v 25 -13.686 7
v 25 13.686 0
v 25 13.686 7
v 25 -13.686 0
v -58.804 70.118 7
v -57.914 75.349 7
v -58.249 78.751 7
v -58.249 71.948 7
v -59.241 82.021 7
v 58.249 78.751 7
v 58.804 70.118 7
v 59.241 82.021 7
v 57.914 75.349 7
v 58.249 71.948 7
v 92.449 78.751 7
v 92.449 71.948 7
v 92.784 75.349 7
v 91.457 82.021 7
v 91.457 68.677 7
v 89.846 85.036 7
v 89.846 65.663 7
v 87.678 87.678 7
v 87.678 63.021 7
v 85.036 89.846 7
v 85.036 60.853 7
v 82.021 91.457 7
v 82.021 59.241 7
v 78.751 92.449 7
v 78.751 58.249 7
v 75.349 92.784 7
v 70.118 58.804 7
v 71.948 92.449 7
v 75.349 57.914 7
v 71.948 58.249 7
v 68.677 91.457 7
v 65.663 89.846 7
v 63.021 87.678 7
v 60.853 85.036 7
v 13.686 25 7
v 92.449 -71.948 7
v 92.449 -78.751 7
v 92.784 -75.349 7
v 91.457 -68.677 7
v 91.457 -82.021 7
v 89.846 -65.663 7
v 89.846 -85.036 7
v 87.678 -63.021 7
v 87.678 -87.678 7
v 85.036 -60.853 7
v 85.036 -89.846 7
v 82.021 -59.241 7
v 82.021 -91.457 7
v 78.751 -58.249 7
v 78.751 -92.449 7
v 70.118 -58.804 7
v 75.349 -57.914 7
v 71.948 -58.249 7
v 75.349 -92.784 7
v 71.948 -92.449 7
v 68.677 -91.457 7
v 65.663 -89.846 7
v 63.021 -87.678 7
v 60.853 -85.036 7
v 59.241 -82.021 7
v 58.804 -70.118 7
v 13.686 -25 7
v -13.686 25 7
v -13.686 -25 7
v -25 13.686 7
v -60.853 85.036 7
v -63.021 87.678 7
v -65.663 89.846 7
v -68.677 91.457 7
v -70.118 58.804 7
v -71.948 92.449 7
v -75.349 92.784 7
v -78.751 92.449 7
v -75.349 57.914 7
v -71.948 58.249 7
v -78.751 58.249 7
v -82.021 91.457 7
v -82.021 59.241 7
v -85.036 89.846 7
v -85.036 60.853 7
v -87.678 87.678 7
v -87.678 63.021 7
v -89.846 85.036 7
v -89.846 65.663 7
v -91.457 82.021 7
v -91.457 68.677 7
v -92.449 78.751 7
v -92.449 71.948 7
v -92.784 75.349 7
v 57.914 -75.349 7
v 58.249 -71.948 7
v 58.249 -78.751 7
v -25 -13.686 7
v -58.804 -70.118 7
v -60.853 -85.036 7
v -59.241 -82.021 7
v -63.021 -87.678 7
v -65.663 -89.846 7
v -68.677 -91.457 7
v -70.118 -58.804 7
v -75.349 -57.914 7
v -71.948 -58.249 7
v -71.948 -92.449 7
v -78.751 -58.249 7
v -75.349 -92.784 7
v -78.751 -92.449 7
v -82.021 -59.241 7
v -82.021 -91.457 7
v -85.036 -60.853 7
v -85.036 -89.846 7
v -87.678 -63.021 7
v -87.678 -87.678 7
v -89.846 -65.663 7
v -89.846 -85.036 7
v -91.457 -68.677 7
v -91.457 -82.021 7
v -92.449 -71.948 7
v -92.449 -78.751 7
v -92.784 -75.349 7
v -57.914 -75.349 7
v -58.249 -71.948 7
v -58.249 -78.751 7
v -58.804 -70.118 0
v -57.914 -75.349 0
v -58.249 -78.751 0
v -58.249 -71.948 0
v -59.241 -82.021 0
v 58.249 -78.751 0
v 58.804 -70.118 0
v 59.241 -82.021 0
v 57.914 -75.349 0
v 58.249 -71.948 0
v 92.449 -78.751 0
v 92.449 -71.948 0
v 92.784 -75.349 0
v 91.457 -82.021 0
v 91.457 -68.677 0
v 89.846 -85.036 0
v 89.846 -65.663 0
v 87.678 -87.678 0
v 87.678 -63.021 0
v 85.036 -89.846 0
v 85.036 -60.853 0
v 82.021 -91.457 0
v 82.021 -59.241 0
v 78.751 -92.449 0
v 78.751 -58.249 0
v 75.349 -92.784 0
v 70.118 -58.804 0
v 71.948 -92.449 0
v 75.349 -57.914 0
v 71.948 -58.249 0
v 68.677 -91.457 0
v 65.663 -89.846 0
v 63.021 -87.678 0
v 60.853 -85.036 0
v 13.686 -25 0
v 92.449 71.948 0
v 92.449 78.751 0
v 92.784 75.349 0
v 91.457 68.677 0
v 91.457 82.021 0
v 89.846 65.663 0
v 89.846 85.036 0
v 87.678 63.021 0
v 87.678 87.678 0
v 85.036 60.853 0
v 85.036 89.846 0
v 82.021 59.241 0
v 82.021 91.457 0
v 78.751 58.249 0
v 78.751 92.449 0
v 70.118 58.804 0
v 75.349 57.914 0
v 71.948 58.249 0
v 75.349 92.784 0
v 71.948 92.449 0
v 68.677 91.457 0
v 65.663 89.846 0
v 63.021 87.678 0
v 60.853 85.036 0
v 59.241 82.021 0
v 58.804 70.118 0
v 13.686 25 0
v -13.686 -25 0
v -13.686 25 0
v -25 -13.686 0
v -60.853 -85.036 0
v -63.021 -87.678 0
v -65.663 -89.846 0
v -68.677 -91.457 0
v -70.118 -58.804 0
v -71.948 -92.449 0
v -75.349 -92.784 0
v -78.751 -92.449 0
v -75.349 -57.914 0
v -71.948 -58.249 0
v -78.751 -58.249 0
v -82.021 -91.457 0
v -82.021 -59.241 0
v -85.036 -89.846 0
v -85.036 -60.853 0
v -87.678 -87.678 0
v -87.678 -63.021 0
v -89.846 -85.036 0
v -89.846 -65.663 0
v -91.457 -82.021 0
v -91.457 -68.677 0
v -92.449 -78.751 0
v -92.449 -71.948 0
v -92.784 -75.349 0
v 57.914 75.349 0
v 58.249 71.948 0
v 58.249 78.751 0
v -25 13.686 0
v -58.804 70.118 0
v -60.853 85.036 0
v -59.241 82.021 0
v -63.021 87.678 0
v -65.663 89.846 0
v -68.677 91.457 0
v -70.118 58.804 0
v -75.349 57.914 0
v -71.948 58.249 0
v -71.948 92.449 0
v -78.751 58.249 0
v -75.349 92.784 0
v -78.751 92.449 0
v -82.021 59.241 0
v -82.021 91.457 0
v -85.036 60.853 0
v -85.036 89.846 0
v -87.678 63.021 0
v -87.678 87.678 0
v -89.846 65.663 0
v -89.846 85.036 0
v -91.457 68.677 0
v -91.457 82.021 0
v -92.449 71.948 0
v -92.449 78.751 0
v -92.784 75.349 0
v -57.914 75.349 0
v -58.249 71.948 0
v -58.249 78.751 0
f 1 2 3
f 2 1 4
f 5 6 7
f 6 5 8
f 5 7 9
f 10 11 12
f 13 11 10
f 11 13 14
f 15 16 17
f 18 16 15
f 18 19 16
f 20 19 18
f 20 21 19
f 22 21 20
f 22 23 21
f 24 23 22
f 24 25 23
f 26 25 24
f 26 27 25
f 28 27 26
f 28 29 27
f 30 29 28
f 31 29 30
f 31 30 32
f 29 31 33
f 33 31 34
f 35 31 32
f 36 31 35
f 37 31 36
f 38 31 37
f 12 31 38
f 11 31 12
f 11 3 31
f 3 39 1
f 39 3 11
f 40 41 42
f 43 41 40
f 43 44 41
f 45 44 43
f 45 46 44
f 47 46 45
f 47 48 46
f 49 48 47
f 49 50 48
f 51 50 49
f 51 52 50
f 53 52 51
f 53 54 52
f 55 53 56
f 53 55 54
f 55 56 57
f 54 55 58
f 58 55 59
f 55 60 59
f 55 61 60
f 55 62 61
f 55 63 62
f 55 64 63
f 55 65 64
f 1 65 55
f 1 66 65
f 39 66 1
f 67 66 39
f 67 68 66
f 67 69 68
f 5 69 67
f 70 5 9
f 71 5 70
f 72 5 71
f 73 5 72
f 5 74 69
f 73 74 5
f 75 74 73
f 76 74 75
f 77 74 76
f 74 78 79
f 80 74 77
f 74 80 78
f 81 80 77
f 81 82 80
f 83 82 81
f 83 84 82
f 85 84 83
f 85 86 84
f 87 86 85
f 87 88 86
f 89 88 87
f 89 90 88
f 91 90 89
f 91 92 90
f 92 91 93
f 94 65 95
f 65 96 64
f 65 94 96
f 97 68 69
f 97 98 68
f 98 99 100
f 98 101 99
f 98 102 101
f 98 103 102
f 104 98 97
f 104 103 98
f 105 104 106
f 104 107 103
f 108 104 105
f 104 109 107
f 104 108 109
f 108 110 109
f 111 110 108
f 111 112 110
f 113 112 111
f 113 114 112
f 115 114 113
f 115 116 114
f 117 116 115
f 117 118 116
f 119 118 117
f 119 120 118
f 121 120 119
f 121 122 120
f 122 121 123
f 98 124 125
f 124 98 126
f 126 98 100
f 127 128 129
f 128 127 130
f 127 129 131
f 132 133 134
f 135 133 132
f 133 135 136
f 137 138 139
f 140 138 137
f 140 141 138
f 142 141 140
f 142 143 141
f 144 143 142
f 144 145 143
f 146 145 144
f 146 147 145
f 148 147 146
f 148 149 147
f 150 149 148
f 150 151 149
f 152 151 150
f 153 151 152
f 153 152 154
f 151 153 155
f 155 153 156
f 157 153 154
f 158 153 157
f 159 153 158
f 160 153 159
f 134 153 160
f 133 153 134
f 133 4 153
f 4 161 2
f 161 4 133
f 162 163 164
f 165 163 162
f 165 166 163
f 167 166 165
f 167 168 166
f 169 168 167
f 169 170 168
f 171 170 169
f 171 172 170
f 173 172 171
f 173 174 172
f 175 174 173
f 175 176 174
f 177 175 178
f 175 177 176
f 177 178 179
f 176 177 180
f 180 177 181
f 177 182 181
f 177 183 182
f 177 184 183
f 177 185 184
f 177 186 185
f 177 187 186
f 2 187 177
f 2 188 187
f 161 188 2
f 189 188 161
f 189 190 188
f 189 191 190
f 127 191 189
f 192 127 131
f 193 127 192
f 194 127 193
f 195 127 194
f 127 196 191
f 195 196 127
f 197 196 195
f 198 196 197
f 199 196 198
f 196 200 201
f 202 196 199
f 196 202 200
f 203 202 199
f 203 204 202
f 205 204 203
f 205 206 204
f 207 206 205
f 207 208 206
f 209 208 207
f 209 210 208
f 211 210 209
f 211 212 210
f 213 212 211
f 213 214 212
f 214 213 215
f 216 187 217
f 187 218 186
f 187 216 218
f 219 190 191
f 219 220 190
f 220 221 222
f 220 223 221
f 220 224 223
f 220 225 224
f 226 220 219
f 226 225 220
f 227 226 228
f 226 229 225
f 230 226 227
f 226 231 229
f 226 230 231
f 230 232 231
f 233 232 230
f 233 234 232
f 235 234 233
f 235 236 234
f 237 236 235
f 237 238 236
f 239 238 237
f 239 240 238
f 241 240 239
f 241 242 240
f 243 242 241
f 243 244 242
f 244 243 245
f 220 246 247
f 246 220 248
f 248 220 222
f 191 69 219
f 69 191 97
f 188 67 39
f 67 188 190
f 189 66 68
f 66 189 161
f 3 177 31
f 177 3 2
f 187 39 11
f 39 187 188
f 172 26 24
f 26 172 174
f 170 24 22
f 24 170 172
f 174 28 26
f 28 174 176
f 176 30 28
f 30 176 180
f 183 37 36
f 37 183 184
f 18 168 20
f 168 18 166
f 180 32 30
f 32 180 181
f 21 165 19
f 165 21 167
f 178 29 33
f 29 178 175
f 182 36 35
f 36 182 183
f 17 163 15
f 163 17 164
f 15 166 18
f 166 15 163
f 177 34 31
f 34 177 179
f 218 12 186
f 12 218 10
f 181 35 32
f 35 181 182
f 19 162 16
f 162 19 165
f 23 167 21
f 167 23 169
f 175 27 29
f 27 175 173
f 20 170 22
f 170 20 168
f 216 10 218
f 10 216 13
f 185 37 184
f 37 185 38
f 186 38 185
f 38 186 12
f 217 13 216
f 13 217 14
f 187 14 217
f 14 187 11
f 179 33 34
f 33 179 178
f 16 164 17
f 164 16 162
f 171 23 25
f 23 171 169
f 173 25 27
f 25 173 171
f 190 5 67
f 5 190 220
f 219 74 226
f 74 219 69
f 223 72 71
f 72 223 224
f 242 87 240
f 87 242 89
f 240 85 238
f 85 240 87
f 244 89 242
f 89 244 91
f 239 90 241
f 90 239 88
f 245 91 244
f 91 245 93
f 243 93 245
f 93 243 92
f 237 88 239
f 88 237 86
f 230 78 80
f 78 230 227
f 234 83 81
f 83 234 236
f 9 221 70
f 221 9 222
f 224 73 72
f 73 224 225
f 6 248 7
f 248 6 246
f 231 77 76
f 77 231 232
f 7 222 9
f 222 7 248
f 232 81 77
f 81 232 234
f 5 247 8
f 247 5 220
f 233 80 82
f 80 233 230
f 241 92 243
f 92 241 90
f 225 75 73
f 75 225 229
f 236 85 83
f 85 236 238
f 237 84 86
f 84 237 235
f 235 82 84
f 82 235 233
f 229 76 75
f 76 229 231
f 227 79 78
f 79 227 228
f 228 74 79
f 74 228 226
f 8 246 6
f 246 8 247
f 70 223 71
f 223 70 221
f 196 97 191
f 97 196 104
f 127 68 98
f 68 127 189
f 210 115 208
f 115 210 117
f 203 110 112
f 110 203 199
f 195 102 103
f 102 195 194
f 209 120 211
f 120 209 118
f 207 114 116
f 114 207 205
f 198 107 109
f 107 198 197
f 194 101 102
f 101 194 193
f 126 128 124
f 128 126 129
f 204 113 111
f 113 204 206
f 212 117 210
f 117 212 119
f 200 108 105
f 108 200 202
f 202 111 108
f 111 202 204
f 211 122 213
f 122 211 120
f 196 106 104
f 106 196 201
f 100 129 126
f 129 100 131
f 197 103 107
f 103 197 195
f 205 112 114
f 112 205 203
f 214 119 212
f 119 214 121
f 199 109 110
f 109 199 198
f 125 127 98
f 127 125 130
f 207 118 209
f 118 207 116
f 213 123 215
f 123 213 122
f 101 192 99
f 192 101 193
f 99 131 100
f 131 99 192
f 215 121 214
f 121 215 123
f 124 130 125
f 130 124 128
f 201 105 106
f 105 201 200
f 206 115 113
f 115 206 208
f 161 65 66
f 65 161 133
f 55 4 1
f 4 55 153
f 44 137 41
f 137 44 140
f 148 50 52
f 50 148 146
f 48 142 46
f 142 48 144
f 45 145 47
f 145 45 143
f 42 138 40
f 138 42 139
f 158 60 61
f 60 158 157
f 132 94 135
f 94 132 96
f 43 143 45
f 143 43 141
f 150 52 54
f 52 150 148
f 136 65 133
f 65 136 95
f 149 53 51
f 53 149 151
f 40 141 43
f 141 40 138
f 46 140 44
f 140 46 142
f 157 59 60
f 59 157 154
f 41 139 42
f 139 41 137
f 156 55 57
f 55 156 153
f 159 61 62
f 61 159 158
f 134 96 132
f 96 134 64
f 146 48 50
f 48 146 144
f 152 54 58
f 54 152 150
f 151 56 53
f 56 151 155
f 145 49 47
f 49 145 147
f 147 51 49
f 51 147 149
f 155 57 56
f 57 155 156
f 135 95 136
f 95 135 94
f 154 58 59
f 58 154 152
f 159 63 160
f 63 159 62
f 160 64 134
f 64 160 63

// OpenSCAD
$fn = 32;

// ----------------------------------------------------------------------
// Quadcopter frame: 248 mm across the motor pads, arms 106.56 mm
// ----------------------------------------------------------------------

// --- parameters (mm) ---
hub = 50;                 // central plate size
plate_t = 7;              // plate thickness
arm_len = 106.56;         // hub centre to motor pad centre
bar_w = 16;               // arm width
pad_d = 34.87;            // motor pad diameter

module arm_bar() {
  /* flat bar: hull of a stub inside the hub and a box at the pad */
  hull() {
    translate([hub / 4, 0, plate_t / 2]) cube([bar_w, bar_w, plate_t], center = true);
    translate([arm_len, 0, plate_t / 2]) cube([bar_w, bar_w, plate_t], center = true);
  }
}

module pad() {
  translate([arm_len, 0, 0]) cylinder(h = plate_t, d = pad_d);
}

module frame() {
  translate([-hub / 2, -hub / 2, 0]) cube([hub, hub, plate_t]);
  rotate([0, 0, 45]) arm_bar();
  rotate([0, 0, 45]) pad();
  rotate([0, 0, 135]) arm_bar();
  rotate([0, 0, 135]) pad();
  rotate([0, 0, 225]) arm_bar();
  rotate([0, 0, 225]) pad();
  rotate([0, 0, 315]) arm_bar();
  rotate([0, 0, 315]) pad();
}

difference() {
  frame();
}
